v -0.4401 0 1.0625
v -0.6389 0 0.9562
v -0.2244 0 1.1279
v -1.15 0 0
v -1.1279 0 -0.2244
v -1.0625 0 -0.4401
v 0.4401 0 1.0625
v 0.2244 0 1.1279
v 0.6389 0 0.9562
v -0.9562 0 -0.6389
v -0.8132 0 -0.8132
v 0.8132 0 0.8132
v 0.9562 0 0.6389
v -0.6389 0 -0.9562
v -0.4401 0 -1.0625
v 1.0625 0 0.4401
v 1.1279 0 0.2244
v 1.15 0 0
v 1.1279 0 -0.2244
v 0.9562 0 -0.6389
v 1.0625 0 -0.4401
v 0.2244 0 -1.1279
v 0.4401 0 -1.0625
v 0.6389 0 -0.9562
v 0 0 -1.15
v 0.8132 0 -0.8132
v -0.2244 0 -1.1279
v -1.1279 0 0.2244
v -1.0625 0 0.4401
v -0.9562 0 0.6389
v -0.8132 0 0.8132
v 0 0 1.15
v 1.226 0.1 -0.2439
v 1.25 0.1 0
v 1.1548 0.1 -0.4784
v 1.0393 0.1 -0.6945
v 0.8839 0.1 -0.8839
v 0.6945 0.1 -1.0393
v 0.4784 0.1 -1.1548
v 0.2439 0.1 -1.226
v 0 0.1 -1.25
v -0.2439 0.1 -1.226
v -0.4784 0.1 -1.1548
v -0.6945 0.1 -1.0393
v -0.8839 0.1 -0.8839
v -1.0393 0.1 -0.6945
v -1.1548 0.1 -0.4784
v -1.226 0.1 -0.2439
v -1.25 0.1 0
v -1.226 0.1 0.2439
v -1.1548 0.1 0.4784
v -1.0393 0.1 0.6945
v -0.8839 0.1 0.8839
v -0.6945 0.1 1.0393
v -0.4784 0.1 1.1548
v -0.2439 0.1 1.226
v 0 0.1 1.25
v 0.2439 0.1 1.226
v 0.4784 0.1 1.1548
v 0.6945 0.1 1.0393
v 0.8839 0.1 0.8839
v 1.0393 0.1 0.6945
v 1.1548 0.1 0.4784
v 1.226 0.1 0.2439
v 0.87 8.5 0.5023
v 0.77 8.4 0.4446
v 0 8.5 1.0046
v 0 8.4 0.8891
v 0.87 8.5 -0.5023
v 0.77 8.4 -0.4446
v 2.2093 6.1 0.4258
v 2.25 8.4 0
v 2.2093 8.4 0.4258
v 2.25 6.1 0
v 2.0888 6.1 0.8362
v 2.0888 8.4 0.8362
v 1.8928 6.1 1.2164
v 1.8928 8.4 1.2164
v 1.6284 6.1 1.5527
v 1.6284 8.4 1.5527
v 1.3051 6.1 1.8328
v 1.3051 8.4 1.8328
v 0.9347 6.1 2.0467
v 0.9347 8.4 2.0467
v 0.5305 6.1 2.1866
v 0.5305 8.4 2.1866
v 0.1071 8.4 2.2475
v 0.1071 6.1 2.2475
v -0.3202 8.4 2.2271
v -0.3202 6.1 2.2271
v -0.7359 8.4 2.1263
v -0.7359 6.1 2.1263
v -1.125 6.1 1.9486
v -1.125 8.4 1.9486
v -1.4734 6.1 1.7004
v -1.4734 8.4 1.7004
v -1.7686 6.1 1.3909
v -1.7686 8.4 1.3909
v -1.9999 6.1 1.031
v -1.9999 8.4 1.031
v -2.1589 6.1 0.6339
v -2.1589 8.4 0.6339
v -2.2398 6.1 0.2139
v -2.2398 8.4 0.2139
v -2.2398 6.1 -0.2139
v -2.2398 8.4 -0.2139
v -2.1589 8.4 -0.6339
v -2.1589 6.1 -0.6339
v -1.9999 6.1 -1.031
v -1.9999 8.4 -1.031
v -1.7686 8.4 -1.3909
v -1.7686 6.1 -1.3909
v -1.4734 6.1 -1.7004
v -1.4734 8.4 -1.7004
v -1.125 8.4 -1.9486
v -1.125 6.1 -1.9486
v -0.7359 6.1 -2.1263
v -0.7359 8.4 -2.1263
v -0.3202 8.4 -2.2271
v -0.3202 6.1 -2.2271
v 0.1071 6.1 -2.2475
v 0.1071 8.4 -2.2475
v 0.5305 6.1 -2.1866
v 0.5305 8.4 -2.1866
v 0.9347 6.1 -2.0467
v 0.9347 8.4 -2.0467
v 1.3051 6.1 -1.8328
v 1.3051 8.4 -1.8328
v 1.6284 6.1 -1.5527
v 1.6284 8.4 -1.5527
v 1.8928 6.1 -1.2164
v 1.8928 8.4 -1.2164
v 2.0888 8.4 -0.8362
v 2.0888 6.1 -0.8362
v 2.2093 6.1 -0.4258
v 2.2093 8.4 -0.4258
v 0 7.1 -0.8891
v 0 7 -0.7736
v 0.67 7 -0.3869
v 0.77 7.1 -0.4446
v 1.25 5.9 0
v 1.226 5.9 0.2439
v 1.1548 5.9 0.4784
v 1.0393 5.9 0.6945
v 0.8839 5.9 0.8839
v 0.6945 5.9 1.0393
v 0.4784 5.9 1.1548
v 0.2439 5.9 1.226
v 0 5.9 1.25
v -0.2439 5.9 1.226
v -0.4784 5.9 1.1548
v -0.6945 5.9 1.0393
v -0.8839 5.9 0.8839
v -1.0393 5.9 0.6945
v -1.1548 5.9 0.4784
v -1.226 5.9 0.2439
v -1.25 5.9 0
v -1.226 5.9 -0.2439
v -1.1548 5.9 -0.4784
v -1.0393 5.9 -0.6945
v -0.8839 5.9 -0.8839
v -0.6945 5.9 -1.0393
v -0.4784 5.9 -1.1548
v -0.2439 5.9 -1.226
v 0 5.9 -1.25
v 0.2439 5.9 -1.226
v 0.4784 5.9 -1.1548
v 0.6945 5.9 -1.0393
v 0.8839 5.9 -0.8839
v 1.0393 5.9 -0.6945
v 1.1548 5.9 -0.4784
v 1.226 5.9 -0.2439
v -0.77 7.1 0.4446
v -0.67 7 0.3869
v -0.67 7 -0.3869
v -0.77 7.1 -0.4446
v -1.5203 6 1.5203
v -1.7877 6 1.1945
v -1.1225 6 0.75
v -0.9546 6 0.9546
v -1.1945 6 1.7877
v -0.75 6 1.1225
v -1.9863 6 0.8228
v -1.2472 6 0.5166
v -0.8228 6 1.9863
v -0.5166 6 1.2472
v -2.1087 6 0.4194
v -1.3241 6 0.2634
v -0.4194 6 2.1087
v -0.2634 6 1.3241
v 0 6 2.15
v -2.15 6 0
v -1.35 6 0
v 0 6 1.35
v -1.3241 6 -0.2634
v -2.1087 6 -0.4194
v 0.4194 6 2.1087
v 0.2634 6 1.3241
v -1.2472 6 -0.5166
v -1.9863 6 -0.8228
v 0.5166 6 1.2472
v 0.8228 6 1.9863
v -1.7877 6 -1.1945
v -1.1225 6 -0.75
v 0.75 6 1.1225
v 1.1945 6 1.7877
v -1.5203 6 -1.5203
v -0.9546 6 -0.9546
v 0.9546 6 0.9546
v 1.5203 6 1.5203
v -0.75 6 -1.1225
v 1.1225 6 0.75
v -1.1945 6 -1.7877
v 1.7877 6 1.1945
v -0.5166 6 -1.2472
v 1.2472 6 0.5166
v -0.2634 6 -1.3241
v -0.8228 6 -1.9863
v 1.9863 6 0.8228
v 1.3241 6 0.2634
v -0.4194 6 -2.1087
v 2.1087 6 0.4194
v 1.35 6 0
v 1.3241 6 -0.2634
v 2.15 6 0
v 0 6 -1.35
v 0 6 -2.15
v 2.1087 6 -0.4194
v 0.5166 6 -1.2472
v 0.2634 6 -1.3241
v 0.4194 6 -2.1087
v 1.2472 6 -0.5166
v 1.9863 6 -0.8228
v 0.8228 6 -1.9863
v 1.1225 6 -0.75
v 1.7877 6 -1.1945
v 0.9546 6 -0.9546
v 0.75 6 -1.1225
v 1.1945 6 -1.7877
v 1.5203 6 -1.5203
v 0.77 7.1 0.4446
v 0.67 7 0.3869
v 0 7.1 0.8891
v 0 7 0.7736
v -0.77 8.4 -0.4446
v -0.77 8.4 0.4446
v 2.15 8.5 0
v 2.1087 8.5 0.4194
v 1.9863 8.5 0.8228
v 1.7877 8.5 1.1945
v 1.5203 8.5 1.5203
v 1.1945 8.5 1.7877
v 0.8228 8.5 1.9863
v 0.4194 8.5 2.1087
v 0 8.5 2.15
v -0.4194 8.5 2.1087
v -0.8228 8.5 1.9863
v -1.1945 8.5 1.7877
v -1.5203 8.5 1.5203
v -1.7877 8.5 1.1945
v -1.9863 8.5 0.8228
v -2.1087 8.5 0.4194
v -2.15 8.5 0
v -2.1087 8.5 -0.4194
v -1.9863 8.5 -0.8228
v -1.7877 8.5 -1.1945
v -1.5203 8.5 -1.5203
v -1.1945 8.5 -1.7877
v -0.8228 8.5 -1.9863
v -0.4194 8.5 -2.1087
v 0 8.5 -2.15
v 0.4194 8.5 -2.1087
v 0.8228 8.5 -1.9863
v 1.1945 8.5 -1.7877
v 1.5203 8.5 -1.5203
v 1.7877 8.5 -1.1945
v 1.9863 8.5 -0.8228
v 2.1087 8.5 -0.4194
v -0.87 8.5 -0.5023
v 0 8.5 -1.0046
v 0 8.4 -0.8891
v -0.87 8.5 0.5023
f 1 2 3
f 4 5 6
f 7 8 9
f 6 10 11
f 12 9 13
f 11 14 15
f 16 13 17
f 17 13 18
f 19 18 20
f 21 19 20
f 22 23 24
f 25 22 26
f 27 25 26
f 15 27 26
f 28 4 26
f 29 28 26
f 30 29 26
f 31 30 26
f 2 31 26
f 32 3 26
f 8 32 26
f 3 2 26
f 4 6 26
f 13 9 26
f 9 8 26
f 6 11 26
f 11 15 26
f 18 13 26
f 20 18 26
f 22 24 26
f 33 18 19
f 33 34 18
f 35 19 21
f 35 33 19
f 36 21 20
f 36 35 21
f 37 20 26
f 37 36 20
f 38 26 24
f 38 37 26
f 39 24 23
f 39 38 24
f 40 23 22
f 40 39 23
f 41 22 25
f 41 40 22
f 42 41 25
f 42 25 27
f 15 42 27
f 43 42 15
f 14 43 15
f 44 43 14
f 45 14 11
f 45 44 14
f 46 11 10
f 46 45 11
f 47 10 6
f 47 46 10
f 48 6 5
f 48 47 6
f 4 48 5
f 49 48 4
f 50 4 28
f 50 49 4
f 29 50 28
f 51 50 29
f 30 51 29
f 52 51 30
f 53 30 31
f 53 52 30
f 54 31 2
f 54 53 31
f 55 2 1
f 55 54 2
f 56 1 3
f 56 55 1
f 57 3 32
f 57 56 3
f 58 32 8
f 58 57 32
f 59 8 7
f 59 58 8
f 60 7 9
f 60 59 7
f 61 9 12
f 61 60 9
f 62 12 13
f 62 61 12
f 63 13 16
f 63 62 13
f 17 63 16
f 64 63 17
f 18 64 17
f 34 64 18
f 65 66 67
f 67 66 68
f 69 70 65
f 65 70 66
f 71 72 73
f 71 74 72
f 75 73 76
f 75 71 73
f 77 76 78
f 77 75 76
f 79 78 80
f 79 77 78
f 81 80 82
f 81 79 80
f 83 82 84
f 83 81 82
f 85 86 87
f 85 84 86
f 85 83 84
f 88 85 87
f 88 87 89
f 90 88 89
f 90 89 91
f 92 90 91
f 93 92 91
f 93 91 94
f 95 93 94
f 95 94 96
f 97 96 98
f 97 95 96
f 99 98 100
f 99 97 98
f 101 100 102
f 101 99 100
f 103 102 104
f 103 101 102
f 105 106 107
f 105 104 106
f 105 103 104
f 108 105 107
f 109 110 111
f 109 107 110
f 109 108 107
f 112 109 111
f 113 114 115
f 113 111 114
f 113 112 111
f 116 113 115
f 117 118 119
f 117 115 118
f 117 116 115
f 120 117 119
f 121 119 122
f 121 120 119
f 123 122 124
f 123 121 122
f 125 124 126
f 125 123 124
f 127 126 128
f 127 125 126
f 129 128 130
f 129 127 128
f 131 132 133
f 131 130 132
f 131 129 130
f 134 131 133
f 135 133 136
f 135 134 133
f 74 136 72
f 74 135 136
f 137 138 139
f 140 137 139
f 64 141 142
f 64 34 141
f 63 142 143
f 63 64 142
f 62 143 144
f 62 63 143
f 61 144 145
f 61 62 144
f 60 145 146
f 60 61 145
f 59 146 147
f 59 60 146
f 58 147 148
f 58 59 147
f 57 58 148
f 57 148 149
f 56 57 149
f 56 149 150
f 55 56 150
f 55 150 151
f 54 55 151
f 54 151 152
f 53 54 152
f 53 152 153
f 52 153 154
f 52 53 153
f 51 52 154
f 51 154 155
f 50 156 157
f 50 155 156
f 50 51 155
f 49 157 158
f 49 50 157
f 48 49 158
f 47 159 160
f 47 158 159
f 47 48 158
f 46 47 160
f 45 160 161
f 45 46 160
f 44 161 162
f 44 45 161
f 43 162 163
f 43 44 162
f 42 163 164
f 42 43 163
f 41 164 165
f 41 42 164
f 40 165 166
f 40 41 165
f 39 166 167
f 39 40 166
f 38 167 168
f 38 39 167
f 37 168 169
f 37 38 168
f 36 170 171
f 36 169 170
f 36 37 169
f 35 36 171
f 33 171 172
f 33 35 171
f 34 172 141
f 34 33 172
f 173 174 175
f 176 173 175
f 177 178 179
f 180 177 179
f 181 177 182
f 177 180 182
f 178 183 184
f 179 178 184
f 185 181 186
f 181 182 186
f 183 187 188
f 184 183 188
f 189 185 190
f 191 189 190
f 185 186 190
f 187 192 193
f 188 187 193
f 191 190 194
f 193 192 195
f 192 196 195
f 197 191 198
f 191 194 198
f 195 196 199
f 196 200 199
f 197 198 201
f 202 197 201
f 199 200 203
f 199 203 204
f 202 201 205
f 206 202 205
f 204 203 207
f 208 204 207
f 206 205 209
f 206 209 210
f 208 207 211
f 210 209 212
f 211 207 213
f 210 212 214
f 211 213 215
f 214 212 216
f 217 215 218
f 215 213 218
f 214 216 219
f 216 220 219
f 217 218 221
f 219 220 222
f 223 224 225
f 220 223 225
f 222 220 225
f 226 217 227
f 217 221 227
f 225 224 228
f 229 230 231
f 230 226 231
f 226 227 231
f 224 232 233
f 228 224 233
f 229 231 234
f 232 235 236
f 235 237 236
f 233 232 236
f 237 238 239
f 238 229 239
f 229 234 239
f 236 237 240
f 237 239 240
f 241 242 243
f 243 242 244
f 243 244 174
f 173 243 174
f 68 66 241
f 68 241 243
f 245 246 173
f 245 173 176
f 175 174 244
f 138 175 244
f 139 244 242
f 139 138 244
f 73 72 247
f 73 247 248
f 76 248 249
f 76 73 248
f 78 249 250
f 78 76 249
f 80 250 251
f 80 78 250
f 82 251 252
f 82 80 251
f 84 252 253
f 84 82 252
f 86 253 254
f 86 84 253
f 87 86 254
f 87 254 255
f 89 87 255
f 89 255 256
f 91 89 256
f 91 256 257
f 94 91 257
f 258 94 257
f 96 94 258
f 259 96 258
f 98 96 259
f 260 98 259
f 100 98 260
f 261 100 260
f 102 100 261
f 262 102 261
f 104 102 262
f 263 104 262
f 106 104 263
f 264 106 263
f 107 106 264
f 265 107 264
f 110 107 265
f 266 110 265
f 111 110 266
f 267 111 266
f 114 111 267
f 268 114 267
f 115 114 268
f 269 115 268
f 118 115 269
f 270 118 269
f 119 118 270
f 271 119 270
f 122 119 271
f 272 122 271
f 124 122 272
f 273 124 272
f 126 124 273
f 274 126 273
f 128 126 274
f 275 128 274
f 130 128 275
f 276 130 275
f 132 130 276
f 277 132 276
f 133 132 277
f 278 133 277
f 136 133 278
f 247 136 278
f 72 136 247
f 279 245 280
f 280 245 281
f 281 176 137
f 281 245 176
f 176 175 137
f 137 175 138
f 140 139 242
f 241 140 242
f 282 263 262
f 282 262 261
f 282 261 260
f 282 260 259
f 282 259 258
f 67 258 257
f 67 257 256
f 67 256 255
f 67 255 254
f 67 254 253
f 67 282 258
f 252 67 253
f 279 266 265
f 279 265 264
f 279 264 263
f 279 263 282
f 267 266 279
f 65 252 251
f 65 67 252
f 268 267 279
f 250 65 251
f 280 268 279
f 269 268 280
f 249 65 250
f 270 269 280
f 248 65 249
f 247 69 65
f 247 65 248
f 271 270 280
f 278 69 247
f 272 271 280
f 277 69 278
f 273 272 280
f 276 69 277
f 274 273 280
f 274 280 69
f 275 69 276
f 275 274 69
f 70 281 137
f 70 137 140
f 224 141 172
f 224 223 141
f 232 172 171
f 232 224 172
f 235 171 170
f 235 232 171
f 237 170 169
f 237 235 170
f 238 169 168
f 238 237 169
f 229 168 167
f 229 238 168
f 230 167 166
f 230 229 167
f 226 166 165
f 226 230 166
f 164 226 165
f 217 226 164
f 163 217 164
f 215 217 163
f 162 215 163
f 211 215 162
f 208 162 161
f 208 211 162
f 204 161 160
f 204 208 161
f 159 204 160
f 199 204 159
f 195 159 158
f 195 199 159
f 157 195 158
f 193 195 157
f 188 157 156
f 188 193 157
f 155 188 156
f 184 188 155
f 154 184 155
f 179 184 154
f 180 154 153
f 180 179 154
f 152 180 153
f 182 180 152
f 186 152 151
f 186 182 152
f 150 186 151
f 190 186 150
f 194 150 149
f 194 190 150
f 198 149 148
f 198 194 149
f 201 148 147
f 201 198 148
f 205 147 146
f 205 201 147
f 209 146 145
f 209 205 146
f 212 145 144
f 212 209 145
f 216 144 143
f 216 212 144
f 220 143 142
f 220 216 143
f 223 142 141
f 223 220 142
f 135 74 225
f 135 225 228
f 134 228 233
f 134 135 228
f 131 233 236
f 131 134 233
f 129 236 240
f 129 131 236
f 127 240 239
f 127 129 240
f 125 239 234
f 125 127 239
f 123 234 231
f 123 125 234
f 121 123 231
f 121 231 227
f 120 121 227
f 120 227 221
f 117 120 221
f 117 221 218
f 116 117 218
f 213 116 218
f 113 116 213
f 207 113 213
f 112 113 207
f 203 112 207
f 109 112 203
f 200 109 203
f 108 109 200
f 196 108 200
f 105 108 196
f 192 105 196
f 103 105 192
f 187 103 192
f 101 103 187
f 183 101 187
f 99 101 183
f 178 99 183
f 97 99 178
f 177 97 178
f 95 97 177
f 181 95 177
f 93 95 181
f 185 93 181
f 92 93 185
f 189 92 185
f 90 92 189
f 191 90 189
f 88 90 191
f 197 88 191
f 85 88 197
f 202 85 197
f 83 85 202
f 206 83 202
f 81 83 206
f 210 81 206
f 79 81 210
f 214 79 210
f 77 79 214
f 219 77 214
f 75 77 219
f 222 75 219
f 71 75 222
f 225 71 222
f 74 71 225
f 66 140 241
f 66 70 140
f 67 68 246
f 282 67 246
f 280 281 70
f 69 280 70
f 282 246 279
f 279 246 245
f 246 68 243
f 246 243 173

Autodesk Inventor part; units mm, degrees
ref_plane "YZ Plane" through (0, 0, 0) normal (1, 0, 0) x (0, 1, 0)
ref_plane "XZ Plane" through (0, 0, 0) normal (0, 1, 0) x (-1, 0, 0)
ref_plane "XY Plane" through (0, 0, 0) normal (0, 0, 1) x (1, 0, 0)
sketch "Sketch1" plane through (0, 0, 0) normal (0, 0, 1) x (1, 0, 0)
  line L0 (0, 8.5) -> (2.25, 8.5)
  line L1 (2.25, 8.5) -> (2.25, 6)
  line L2 (2.25, 6) -> (1.25, 6)
  line L3 (1.25, 6) -> (1.25, 0)
  line L4 (1.25, 0) -> (0, 0)
  line L5 (0, 0) -> (0, 8.5)
  dimension "d0" = 2.25
  dimension "d1" = 2.5
  dimension "d2" = 6
  dimension "d3" = 1.25
revolve "Revolution1" add sketch "Sketch1" angle 360 about axis through (0, 0, 0) along (0, 1, 0)
thread "Thread1" size "M2.5x0.45" class "6g" standard "ANSI Metric M Profile" full length
sketch "Sketch3" plane through (0, 8.5, 0) normal (0, 1, 0) x (1, 0, 0)
  line L0 (0.77, -0.4446) -> (0, -0.8891)
  line L1 (0, -0.8891) -> (-0.77, -0.4446)
  line L2 (-0.77, -0.4446) -> (-0.77, 0.4446)
  line L3 (-0.77, 0.4446) -> (0, 0.8891)
  line L4 (0, 0.8891) -> (0.77, 0.4446)
  line L5 (0.77, 0.4446) -> (0.77, -0.4446)
  point P0 (0, 0)
  point P1 (0, 0)
  dimension "d13" = 1.54
extrude "Extrusion2" cut sketch "Sketch3" against normal blind 1.5
chamfer "Chamfer2" distance 0.1 angle 45 16 edges at (0.385, 8.5, 0.6668) (0.77, 8.5, 0) (0.77, 7, 0) (0.385, 8.5, -0.6668) (0.385, 7, -0.6668) (-0.385, 8.5, -0.6668) (-0.385, 7, -0.6668) (-0.77, 7, 0) (-0.77, 8.5, 0) (-0.385, 7, 0.6668) (-0.385, 8.5, 0.6668) (0.385, 7, 0.6668) (-2.25, 8.5, 0) (-2.25, 6, 0) (-1.25, 6, 0) (-1.25, 0, 0)
properties part number "M2.5 X 6"
